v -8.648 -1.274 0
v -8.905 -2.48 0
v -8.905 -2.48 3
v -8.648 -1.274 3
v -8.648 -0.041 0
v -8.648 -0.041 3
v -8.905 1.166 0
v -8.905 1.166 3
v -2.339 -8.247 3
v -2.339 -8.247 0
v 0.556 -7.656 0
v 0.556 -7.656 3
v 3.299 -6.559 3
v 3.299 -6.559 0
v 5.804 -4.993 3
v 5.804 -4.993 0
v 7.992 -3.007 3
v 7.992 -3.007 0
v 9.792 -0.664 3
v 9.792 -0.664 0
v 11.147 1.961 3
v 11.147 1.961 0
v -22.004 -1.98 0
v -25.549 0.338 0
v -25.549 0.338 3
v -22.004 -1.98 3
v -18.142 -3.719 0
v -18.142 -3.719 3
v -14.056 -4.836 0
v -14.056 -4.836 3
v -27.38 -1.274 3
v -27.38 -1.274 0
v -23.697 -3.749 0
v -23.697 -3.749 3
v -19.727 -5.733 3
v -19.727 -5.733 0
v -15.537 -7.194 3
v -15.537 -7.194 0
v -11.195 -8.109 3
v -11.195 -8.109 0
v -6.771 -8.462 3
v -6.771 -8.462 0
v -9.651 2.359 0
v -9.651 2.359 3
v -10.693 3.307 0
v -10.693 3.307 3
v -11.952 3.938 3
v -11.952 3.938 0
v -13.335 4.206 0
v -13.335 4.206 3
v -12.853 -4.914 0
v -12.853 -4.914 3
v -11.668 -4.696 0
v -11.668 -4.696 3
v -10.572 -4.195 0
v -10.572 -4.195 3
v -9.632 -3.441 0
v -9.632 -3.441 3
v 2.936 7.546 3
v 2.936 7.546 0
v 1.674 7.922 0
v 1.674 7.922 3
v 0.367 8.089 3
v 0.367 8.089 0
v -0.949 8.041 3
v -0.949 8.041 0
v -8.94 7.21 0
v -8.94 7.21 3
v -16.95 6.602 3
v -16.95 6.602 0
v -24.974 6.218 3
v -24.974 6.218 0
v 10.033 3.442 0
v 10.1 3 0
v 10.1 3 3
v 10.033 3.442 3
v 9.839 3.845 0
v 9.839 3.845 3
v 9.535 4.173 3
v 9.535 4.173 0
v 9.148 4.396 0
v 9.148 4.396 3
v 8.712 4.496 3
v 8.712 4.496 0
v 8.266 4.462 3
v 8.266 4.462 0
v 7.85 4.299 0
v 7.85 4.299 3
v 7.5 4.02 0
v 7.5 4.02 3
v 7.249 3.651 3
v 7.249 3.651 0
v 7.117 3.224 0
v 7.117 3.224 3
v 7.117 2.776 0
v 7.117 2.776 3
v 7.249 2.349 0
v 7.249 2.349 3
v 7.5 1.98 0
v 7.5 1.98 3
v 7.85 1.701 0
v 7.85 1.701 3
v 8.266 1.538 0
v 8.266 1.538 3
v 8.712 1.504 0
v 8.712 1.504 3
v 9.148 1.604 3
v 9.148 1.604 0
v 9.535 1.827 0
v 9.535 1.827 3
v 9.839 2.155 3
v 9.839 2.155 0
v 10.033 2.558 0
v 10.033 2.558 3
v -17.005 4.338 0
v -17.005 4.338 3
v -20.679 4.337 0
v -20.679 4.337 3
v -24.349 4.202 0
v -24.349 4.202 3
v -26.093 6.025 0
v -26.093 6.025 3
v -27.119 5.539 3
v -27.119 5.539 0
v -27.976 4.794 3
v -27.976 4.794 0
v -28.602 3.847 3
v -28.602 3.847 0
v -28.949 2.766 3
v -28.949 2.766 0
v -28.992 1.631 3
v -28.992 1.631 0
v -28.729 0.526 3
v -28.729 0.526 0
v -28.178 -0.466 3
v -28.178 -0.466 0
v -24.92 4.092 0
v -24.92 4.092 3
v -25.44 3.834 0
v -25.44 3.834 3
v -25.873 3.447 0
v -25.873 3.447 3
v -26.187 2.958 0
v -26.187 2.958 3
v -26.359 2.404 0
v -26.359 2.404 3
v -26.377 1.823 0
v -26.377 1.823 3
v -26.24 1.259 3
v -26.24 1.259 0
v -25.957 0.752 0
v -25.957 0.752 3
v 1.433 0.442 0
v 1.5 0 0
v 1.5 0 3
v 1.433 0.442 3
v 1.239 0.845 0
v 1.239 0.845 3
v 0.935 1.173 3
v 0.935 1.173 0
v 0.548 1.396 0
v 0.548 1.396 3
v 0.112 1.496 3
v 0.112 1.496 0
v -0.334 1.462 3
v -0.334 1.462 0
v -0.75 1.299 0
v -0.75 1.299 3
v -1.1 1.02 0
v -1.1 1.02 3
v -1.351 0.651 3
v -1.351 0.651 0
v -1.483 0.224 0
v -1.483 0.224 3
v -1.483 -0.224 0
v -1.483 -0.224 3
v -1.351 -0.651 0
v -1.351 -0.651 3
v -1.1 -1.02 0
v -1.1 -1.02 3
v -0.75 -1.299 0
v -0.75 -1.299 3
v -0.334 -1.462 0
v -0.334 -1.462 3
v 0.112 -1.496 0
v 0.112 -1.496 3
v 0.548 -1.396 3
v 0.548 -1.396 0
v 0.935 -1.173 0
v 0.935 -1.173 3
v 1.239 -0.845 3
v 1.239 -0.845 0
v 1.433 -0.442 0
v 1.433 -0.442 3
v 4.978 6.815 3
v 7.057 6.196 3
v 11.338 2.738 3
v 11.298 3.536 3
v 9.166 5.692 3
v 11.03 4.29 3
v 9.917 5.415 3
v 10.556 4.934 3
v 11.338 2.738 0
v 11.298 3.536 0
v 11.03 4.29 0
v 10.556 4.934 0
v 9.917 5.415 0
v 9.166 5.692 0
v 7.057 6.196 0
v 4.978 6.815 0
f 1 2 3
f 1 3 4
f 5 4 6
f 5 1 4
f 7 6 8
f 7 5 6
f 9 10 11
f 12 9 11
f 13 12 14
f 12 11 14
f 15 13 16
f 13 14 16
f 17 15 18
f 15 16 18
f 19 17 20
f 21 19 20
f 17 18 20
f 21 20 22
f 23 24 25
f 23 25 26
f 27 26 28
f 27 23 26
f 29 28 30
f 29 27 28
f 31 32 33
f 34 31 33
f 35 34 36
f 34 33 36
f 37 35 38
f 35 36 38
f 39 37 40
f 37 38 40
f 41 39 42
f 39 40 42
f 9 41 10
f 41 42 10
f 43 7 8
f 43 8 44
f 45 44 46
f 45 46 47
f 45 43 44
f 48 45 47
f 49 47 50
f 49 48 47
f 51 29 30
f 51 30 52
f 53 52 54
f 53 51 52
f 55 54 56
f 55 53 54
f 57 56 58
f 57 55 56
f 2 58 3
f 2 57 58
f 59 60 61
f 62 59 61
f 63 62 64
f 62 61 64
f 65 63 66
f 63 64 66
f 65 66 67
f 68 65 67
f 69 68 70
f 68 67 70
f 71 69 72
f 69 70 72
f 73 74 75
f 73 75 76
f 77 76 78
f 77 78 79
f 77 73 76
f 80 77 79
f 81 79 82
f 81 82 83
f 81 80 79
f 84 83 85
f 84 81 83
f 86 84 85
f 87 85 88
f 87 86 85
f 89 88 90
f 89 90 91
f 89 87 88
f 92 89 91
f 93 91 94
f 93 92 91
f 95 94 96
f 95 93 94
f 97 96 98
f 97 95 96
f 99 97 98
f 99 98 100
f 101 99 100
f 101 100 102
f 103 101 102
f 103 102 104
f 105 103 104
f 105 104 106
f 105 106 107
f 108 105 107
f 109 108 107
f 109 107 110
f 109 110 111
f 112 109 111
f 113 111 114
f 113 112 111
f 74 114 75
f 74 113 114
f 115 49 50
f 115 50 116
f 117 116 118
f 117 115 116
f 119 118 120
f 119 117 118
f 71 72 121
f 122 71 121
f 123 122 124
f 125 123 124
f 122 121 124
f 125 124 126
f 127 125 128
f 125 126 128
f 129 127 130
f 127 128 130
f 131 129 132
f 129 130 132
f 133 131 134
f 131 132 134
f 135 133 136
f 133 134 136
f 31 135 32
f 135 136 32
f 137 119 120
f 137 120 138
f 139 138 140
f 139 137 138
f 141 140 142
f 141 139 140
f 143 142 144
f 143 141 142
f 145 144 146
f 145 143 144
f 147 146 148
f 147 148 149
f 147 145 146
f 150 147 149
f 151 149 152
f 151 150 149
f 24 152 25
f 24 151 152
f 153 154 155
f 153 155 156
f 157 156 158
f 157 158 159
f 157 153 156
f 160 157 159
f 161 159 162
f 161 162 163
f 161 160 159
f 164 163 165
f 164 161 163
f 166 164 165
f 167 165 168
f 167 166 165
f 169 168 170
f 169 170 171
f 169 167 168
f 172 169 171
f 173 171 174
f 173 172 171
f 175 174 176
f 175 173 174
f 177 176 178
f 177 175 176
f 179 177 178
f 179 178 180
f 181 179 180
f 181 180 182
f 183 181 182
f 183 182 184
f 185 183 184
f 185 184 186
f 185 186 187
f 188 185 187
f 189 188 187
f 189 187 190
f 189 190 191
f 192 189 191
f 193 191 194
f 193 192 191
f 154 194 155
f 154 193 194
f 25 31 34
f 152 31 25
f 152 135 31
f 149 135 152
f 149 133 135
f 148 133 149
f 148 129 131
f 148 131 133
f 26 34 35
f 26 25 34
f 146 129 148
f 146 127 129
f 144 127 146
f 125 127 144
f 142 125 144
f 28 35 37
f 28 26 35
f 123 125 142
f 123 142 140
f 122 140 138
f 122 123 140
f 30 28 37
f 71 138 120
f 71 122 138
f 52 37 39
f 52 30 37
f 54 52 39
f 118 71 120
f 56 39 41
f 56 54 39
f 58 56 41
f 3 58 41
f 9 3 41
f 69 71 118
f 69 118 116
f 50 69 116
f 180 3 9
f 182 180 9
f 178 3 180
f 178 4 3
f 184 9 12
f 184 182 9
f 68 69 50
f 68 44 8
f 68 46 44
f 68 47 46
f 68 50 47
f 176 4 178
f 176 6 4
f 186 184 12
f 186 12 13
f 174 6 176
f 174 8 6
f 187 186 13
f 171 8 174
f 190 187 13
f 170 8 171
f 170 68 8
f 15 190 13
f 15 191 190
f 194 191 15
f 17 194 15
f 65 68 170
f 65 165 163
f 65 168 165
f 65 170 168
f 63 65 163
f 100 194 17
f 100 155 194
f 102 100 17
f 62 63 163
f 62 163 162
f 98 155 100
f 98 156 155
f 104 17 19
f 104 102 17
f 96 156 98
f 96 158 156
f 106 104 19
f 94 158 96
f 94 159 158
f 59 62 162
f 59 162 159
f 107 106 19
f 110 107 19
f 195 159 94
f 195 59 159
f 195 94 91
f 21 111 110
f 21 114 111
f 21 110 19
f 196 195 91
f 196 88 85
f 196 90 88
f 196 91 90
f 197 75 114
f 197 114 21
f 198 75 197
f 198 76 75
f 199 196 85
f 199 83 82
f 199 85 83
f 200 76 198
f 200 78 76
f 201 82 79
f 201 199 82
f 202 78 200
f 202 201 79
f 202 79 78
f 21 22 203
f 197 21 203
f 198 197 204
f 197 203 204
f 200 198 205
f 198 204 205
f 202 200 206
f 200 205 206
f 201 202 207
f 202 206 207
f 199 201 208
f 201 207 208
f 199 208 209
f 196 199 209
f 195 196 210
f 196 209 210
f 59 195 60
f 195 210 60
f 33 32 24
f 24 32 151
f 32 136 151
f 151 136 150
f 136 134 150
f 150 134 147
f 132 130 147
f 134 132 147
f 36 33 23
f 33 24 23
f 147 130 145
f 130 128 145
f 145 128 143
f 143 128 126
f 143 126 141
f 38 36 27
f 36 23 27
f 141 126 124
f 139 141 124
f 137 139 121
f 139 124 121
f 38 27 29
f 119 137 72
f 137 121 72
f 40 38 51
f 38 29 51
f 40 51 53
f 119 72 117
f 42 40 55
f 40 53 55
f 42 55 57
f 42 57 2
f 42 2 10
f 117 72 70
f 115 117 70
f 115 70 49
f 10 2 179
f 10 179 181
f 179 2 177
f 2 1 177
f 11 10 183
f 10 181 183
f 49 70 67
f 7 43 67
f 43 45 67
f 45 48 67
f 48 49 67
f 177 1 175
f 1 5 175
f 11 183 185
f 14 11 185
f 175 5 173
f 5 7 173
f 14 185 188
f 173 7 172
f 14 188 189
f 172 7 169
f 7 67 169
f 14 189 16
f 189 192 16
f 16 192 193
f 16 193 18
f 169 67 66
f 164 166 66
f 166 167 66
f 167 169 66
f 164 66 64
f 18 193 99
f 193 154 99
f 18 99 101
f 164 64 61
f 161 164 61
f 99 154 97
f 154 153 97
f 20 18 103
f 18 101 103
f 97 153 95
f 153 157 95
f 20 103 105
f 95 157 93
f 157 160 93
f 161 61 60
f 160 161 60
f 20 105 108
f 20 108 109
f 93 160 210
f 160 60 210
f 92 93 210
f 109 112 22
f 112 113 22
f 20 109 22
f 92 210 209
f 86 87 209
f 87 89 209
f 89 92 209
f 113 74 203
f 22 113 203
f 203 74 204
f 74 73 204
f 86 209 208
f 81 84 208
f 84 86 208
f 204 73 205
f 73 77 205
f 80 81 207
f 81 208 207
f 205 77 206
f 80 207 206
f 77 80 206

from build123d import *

# Parameters (mm, degrees)
ESQUISSE1_R        = 1.5
BOSS_EXTRU_1_DEPTH = 3


with BuildPart() as part:
    # Esquisse1 → Boss.-Extru.1 (new body)
    with BuildSketch(Plane.XY):
        with BuildLine():
            ThreePointArc((-27.380276014, -1.274350161), (-15.537335082, -7.194462147), (-2.33906069, -8.247329135))
            ThreePointArc((-2.33906069, -8.247329135), (5.804479886, -4.993281455), (11.147191658, 1.960962596))
            ThreePointArc((11.147191658, 1.960962596), (11.029757514, 4.289985461), (9.166322528, 5.692036935))
            ThreePointArc((9.166322528, 5.692036935), (6.013301366, 6.491366031), (2.936209941, 7.545869621))
            ThreePointArc((2.936209941, 7.545869621), (1.023768623, 8.032021848), (-0.949475558, 8.041142538))
            ThreePointArc((-0.949475558, 8.041142538), (-12.942714913, 6.878410061), (-24.974047874, 6.217528689))
            ThreePointArc((-24.974047874, 6.217528689), (-28.81213344, 3.317884658), (-27.380276014, -1.274350161))
        make_face()
        Circle(ESQUISSE1_R, mode=Mode.SUBTRACT)
        with Locations((8.6, 3)):
            Circle(ESQUISSE1_R, mode=Mode.SUBTRACT)
        with BuildLine():
            ThreePointArc((-25.549202237, 0.33835127), (-20.107029847, -2.924841196), (-14.056052845, -4.835689883))
            ThreePointArc((-14.056052845, -4.835689883), (-11.104571675, -4.479585719), (-8.90463517, -2.480003102))
            ThreePointArc((-8.90463517, -2.480003102), (-8.615705443, -0.657235742), (-8.90463517, 1.165531618))
            ThreePointArc((-8.90463517, 1.165531618), (-10.692993826, 3.307242171), (-13.334564289, 4.205716578))
            ThreePointArc((-13.334564289, 4.205716578), (-18.842020353, 4.354105802), (-24.349363894, 4.201597494))
            ThreePointArc((-24.349363894, 4.201597494), (-26.291680045, 2.686893023), (-25.549202237, 0.33835127))
        make_face(mode=Mode.SUBTRACT)
    extrude(amount=BOSS_EXTRU_1_DEPTH)


solid = part.part
